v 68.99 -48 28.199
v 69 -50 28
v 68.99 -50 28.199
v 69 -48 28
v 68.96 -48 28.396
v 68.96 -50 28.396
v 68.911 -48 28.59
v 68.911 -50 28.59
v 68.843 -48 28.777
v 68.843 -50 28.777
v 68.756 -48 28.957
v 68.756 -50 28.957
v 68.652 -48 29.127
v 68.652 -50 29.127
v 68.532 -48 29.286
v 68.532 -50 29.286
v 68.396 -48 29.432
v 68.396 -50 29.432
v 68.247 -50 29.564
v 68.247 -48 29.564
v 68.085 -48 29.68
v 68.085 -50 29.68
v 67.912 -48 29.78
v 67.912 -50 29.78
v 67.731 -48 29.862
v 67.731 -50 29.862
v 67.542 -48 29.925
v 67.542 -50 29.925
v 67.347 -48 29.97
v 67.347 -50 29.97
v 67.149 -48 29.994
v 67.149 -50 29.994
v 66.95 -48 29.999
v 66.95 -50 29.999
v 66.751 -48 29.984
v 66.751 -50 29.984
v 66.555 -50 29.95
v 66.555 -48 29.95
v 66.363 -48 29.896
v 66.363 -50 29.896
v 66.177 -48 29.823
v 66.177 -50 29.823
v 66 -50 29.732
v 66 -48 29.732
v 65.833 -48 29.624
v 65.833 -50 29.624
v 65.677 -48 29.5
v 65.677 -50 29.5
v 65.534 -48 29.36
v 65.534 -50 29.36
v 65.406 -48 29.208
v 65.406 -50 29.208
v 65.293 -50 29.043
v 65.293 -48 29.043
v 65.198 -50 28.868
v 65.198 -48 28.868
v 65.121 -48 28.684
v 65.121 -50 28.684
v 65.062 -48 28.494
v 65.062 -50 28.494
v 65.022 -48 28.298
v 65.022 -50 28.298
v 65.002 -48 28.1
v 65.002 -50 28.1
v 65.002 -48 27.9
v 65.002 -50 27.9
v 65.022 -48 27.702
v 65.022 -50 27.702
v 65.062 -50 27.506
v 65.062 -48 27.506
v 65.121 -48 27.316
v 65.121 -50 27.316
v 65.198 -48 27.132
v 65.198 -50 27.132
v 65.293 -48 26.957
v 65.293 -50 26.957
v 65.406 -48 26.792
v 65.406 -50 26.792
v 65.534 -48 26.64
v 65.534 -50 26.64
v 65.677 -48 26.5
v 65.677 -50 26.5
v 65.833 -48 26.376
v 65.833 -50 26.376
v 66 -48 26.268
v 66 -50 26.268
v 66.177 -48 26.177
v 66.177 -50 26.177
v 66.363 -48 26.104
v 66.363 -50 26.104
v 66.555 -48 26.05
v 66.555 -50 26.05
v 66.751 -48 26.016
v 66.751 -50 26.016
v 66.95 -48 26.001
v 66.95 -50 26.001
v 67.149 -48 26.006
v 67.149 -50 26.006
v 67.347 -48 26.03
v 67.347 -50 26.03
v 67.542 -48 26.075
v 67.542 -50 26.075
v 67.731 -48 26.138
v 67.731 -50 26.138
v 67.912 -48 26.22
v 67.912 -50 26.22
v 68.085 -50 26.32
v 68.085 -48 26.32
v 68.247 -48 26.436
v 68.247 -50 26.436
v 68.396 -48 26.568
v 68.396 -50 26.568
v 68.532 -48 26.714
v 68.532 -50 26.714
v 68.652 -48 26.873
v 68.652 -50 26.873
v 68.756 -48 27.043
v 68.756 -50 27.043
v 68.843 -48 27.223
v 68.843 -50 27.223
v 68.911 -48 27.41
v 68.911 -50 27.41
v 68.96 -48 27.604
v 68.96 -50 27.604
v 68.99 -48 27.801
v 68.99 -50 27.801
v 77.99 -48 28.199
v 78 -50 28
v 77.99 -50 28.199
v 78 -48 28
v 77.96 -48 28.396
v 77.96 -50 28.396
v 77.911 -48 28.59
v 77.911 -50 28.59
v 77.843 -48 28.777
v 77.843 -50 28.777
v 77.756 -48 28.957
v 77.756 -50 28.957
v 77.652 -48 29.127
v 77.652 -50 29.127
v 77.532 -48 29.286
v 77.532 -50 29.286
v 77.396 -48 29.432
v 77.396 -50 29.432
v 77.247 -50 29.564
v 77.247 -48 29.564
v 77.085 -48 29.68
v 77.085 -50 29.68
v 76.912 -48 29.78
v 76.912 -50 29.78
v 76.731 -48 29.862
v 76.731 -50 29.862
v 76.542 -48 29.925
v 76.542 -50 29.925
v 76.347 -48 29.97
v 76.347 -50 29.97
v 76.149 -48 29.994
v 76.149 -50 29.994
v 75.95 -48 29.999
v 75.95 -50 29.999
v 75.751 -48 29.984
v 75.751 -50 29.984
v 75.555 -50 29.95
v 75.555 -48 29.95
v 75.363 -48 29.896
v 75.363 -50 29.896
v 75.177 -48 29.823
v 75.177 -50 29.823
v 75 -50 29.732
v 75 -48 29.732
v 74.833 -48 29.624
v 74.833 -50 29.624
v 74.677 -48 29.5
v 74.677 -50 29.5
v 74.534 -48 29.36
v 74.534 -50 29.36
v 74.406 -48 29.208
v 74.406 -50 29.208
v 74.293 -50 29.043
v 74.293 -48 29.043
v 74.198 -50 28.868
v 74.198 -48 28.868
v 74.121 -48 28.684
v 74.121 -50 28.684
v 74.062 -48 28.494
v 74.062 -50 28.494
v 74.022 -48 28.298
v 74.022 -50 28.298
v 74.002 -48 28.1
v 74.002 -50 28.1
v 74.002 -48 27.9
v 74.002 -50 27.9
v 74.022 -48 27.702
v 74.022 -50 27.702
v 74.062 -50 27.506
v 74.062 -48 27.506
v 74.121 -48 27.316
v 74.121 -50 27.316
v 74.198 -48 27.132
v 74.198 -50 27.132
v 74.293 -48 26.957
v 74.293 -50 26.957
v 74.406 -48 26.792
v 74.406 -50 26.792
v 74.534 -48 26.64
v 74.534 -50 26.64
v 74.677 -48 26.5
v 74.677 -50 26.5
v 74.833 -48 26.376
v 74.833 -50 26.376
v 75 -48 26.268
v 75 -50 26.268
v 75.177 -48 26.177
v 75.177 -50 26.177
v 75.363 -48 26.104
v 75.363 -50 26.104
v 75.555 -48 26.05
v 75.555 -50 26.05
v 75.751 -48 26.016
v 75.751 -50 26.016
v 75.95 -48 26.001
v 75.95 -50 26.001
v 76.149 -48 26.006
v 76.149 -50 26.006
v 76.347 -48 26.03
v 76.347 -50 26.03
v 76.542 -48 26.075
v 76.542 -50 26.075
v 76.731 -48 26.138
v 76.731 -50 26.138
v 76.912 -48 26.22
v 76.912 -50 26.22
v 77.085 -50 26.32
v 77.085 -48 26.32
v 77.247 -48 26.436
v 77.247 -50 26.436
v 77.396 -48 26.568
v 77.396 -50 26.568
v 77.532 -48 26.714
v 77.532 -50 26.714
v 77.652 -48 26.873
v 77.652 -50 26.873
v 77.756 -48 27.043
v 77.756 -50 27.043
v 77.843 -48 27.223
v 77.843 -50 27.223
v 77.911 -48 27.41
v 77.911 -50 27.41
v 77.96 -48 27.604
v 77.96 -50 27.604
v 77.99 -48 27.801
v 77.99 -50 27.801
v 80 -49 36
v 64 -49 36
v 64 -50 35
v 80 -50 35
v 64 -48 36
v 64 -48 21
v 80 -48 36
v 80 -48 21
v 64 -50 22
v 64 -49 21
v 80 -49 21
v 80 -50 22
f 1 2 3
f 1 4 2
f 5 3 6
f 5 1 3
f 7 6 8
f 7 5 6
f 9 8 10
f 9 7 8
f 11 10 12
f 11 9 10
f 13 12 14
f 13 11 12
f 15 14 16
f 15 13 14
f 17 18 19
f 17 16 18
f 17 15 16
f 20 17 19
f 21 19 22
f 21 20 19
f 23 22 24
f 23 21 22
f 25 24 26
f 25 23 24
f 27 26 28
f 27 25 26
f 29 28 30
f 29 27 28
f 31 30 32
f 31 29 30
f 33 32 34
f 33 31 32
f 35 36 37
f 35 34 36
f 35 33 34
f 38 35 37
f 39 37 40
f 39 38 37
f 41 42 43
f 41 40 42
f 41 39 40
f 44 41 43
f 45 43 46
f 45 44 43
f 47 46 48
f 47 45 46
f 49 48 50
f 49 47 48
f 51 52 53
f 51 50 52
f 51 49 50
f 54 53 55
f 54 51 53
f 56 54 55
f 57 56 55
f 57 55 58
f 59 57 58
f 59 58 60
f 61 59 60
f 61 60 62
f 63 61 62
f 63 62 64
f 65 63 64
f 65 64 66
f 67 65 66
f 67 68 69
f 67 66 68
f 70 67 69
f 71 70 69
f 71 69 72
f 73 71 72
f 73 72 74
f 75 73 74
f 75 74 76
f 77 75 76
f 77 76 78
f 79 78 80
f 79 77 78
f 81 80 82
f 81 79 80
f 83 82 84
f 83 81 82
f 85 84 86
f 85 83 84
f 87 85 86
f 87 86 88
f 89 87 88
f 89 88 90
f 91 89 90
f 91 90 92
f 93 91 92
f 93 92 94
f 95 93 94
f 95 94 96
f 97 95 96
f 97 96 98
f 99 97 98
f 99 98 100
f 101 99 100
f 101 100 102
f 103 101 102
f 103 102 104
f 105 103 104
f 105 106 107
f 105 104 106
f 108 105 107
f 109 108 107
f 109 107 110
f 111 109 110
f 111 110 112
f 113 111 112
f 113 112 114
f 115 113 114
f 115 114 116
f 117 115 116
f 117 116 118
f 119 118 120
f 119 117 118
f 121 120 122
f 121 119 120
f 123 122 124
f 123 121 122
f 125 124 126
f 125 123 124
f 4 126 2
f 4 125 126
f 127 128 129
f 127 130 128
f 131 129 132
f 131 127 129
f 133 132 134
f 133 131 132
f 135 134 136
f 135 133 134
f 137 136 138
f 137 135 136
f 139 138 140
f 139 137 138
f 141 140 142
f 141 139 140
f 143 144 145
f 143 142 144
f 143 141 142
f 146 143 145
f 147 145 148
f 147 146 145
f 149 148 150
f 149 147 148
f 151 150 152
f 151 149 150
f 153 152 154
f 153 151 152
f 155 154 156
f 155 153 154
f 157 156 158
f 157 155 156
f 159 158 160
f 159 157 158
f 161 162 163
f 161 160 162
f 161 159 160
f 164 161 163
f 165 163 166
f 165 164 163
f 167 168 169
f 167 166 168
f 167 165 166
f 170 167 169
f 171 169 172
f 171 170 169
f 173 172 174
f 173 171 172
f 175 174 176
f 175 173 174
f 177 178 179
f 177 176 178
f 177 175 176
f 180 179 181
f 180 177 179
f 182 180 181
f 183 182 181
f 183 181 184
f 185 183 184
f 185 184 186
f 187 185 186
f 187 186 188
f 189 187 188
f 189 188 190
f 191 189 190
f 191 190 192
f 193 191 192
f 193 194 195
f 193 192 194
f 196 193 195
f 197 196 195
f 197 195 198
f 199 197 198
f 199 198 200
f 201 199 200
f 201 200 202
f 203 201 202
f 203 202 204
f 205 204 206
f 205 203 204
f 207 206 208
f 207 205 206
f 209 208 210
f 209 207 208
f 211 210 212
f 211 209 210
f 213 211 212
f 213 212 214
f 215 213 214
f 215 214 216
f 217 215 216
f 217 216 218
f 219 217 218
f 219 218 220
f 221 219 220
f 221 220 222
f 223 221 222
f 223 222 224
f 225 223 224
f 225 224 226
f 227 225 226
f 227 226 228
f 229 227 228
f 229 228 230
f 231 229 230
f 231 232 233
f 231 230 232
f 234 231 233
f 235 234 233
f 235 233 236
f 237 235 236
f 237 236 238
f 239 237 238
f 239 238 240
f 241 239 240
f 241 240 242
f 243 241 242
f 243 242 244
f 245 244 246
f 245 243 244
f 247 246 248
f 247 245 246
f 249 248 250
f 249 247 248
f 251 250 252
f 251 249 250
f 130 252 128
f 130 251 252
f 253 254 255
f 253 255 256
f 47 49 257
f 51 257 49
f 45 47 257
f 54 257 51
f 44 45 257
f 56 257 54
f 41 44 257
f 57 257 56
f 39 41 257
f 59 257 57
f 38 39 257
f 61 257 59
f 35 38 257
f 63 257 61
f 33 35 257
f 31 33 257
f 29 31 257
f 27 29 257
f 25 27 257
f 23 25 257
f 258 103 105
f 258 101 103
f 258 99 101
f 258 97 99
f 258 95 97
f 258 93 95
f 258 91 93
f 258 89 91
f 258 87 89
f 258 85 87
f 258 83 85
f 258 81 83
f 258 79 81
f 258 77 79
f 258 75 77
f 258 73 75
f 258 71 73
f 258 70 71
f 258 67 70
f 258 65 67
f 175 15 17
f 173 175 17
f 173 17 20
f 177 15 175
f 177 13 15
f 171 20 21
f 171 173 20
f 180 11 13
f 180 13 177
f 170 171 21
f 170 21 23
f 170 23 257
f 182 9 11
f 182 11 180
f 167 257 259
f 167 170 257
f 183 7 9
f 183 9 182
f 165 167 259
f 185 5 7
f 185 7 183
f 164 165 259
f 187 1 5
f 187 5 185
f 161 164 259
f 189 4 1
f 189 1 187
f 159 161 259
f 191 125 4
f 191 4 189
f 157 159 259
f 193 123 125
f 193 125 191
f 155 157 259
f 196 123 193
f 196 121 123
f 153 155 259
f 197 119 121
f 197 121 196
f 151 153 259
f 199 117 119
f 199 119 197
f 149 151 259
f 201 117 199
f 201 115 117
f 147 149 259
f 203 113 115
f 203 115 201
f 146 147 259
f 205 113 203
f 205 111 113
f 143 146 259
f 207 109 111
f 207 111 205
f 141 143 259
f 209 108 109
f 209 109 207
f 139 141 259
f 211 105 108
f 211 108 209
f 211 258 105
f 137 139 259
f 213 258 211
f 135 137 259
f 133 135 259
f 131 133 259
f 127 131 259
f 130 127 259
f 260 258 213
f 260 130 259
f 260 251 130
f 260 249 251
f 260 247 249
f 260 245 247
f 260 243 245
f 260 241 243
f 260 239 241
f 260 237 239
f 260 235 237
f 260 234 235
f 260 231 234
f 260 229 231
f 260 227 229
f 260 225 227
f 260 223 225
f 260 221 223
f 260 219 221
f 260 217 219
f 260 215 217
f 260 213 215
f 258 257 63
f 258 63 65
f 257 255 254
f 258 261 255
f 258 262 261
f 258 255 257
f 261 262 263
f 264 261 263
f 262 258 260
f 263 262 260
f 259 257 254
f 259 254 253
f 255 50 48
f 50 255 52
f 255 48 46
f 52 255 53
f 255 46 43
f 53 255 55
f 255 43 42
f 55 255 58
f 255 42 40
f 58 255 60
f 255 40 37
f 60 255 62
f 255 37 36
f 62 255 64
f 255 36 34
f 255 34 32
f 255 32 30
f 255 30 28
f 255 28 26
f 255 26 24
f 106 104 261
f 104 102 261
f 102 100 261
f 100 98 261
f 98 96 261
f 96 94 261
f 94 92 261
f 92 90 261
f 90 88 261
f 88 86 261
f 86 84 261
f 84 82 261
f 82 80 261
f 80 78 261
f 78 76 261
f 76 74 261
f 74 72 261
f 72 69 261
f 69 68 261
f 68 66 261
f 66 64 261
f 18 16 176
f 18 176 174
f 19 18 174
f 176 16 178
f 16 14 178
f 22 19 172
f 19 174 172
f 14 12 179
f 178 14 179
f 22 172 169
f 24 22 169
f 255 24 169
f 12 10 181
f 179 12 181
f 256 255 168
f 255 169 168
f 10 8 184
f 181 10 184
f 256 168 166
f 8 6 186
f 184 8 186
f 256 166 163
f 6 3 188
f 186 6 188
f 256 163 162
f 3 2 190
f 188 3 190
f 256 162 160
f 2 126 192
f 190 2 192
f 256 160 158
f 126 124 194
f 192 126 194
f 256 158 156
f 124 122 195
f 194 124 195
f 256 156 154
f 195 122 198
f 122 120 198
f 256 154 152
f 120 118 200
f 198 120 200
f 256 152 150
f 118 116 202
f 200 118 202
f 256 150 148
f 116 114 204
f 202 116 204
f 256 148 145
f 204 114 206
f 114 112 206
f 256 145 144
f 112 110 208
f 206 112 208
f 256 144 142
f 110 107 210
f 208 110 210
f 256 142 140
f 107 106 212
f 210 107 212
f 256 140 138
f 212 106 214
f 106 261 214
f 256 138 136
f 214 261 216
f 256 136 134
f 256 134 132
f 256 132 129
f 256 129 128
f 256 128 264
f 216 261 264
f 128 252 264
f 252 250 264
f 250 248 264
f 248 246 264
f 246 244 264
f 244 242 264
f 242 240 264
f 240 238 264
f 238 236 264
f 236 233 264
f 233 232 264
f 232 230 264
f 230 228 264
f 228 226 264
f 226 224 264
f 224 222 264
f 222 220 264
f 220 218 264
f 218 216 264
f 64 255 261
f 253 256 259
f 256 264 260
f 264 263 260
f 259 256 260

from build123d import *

# Parameters (mm, degrees)
CYLINDER052_R          = 2
CYLINDER052_DEPTH      = 10
CYLINDER052_ROLL_ANGLE = 90
CYLINDER051_R          = 2
CYLINDER051_DEPTH      = 10
CYLINDER051_ROLL_ANGLE = 90
BOX013_W               = 16
BOX013_H               = 2
BOX013_DEPTH           = 15
CHAMFER016_SIZE        = 1


with BuildPart() as cilindro049:
    # Cylinder052 → Cylinder052 (new body)
    with BuildSketch(Plane.XY):
        Circle(CYLINDER052_R)
    extrude(amount=CYLINDER052_DEPTH)


with BuildPart() as cilindro049_1:
    # Cylinder052 roll: moved
    add(cilindro049.part.rotate(Axis((0, 0, 0), (1, 0, 0)), CYLINDER052_ROLL_ANGLE))


with BuildPart() as cilindro049_2:
    # Cylinder052 placement: moved
    add(cilindro049_1.part.moved(Location((76, -37, 30))))


with BuildPart() as fusion012:
    # Cylinder051 → Cylinder051 (new body)
    with BuildSketch(Plane.XY):
        Circle(CYLINDER051_R)
    extrude(amount=CYLINDER051_DEPTH)


with BuildPart() as fusion012_1:
    # Cylinder051 roll: moved
    add(fusion012.part.rotate(Axis((0, 0, 0), (1, 0, 0)), CYLINDER051_ROLL_ANGLE))


with BuildPart() as fusion012_2:
    # Cylinder051 placement: moved
    add(fusion012_1.part.moved(Location((67, -37, 30))))

    # Fusion012: union Cilindro049
    add(cilindro049_2.part)


with BuildPart() as presa003:
    # Box013 → Box013 (new body)
    with BuildSketch(Plane(origin=(64, -43, 23), x_dir=(1, 0, 0), z_dir=(0, 0, 1))):
        with Locations((8, 1)):
            Rectangle(BOX013_W, BOX013_H)
    extrude(amount=BOX013_DEPTH)

    # Cut040: cut Fusion012
    add(fusion012_2.part, mode=Mode.SUBTRACT)


with BuildPart() as presa003_1:
    # Cut040 placement: moved
    add(presa003.part.moved(Location((0, -7, -2))))

    # Chamfer016
    chamfer016_edges = [presa003_1.edges().sort_by_distance(p)[0] for p in [
        (72, -50, 21),
        (72, -50, 36),
    ]]
    chamfer(chamfer016_edges, length=CHAMFER016_SIZE)


solid = presa003_1.part
